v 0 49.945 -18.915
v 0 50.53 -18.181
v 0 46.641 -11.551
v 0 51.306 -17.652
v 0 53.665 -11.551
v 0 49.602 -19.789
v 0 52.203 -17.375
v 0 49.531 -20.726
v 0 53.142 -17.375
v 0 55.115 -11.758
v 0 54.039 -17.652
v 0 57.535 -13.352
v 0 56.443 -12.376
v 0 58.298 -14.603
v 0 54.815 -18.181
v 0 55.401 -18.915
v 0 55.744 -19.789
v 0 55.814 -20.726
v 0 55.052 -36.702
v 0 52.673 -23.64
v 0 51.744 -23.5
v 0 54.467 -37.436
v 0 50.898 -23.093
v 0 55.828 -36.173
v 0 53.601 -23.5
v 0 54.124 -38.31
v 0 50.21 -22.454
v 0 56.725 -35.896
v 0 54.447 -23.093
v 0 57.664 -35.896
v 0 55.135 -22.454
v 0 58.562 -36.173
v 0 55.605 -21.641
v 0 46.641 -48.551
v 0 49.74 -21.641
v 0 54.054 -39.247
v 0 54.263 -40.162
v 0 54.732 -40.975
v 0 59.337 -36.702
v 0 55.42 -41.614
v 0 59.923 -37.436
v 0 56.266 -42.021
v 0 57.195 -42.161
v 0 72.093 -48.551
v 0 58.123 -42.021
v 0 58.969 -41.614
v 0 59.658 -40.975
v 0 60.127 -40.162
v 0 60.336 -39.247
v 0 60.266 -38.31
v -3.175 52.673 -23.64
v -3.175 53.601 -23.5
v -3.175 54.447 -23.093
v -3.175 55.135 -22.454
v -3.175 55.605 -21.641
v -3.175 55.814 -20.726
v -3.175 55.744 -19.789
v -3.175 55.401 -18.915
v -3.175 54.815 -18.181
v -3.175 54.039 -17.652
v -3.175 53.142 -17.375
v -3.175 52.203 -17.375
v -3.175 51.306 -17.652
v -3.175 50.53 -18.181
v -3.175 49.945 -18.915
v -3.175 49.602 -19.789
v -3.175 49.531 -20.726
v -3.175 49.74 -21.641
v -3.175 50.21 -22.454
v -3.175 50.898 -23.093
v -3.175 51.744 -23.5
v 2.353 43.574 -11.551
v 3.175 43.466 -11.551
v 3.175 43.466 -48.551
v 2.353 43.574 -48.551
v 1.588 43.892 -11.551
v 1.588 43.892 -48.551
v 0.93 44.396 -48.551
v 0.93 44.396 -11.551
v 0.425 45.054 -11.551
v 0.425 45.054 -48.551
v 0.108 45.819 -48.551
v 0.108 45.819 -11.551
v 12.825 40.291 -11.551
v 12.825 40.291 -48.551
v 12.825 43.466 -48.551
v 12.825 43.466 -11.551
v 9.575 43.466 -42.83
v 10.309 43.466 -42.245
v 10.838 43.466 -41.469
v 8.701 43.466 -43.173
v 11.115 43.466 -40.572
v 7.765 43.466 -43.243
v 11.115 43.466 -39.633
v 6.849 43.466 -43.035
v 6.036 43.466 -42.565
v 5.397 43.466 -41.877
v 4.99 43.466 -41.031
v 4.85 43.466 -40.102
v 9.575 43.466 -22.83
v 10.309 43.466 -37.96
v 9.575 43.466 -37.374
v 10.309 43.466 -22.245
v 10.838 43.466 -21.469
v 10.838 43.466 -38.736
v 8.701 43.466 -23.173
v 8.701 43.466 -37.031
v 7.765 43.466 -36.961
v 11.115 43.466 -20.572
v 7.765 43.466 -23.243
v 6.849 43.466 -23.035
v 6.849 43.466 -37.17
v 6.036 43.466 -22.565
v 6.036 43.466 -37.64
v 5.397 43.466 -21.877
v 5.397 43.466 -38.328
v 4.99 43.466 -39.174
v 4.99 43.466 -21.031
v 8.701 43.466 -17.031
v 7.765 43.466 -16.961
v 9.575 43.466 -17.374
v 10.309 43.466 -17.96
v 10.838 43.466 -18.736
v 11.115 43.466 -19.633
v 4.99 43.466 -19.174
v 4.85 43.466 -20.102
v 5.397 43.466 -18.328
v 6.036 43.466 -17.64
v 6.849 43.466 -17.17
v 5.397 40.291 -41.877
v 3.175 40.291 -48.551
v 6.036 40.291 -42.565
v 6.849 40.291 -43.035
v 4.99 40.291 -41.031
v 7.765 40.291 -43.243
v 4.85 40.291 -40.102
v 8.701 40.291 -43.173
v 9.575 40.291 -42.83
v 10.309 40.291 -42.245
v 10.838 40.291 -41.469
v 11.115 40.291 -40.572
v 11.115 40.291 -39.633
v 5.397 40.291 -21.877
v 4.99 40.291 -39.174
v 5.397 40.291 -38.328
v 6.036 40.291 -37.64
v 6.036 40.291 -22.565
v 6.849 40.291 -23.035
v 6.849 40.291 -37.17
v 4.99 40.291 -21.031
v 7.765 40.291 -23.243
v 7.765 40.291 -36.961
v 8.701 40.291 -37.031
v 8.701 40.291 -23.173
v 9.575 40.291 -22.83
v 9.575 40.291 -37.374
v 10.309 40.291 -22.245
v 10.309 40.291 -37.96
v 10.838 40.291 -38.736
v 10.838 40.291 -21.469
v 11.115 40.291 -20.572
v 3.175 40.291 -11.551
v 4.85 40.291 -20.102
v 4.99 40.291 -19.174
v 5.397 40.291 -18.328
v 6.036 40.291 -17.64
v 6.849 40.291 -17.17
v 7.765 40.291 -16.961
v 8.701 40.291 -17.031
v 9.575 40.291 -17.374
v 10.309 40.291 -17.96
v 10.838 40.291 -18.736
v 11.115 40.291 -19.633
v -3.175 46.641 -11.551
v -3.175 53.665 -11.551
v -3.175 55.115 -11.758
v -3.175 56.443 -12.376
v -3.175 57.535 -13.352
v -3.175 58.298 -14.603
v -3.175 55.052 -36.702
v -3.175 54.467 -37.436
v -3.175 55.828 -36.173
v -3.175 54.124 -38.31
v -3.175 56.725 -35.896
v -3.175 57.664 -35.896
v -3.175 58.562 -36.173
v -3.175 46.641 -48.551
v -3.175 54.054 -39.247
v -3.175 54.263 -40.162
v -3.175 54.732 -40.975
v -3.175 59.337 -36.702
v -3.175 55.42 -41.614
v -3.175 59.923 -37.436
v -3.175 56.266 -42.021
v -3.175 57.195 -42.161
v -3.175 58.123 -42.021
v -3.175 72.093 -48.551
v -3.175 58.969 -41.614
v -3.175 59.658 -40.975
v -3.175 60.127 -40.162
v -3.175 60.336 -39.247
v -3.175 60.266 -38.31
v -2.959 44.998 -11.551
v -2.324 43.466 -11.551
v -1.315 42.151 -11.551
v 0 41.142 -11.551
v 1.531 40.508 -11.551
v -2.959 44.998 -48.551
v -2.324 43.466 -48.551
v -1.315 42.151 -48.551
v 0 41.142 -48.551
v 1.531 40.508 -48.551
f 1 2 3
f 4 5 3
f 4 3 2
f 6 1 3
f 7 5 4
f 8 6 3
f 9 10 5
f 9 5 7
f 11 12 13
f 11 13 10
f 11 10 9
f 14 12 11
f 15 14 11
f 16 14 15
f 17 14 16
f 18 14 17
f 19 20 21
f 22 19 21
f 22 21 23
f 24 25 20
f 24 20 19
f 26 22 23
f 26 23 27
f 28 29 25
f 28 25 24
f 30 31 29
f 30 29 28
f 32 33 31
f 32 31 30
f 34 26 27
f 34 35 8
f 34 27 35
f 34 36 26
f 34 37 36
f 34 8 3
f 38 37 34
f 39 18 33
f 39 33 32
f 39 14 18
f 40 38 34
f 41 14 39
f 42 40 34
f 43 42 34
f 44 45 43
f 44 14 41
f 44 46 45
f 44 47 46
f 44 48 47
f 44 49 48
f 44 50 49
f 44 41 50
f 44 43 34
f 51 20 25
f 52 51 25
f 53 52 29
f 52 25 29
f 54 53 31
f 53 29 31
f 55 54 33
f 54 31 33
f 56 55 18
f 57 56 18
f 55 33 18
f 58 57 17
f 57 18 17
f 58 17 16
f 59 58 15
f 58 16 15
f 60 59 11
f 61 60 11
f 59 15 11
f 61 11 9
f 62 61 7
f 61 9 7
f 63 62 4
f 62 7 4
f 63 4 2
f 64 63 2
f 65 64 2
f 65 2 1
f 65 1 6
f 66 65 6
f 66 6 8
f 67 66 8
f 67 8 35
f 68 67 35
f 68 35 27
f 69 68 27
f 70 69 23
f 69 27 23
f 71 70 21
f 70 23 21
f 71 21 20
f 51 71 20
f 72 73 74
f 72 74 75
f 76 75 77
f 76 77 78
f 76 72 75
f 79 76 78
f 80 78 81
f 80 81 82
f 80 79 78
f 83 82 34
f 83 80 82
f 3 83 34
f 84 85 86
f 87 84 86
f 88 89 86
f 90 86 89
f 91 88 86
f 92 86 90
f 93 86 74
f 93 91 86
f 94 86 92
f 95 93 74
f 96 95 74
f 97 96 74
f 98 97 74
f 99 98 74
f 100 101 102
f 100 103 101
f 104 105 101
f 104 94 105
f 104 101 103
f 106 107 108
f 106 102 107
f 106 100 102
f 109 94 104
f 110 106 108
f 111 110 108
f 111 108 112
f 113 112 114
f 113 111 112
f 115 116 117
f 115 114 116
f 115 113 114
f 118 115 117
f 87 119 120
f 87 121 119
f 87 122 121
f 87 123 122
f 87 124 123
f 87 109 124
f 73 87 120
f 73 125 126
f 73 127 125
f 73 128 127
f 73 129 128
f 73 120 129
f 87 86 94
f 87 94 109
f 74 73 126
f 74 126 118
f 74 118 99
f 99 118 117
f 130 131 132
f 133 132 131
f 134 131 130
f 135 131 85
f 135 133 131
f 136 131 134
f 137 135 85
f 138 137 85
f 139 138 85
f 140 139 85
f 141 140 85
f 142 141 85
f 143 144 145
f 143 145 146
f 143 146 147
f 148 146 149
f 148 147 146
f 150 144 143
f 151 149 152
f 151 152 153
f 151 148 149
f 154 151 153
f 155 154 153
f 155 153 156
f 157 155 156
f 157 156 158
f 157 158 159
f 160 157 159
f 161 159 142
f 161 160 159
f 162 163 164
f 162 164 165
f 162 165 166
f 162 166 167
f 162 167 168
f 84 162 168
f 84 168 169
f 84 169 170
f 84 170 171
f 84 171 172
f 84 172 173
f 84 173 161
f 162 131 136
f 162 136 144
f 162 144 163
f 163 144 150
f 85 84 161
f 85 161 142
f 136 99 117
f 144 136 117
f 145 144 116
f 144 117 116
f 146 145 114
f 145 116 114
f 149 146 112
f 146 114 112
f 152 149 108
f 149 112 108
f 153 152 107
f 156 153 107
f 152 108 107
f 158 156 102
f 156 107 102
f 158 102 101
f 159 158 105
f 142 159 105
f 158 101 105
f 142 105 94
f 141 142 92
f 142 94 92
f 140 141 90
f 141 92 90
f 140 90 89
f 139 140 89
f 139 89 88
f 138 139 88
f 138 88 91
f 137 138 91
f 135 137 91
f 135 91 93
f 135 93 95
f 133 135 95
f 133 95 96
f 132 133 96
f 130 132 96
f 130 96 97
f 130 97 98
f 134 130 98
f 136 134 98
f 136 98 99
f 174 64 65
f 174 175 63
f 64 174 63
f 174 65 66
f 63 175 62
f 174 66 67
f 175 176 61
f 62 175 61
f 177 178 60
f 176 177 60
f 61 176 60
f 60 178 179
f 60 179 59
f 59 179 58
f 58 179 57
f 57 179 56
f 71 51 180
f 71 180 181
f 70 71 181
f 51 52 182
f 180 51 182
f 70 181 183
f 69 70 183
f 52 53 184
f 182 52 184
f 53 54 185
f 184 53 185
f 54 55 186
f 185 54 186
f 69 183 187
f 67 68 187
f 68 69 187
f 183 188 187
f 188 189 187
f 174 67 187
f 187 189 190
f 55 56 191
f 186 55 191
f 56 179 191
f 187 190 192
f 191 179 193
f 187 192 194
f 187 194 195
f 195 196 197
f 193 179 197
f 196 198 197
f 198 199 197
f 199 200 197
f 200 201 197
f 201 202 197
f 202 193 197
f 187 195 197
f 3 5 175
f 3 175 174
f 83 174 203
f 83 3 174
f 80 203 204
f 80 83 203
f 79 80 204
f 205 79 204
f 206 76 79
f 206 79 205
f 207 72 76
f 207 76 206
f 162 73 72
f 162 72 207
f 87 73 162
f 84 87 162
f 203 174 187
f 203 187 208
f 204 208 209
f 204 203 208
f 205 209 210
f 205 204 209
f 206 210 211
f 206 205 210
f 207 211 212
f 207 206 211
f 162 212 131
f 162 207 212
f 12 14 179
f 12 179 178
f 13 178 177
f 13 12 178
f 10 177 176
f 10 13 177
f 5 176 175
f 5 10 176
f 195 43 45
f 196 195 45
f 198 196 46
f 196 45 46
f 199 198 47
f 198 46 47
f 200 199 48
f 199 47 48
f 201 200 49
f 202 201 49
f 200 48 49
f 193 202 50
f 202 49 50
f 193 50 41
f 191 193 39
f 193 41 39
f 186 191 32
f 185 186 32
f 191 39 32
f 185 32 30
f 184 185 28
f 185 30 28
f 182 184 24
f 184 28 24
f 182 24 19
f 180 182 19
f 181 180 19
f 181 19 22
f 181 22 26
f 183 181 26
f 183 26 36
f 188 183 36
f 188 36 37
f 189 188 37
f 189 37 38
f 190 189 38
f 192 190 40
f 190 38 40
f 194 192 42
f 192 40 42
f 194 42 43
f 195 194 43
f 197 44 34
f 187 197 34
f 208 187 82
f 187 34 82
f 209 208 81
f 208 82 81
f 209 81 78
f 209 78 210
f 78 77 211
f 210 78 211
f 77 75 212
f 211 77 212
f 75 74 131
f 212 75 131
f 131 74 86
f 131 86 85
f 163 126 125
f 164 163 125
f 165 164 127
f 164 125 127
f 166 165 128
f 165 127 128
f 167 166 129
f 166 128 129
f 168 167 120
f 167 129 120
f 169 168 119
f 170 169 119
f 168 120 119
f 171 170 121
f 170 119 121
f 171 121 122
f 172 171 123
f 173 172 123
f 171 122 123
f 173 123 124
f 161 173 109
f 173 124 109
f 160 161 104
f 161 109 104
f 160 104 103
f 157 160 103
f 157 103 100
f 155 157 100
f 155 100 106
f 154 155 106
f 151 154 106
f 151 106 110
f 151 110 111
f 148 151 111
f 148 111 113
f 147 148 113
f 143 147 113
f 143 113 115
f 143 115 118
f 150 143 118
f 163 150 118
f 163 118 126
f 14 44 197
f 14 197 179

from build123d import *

# Parameters (mm, degrees)
SKETCH2_R                    = 3.15
BASE_FLANGE1_DEPTH           = 3.175
EDGE_FLANGE1_STRIP_W         = 19.05
EDGE_FLANGE1_STRIP_H         = 3.175
EDGE_FLANGE1_STRIP_CUT_DEPTH = 37
EDGE_FLANGE1_DEPTH           = 37
SKETCH10_R                   = 3.15
CUT_EXTRUDE1_DEPTH           = 10


# Sheet-metal steps are written as plain solids
with BuildPart() as part:
    # Sketch2 → Base-Flange1 (new body)
    with BuildSketch(Plane(origin=(0, 0, 0), x_dir=(0, 0, -1), z_dir=(1, 0, 0))):
        with BuildLine():
            Line((48.551064785, 40.291218586), (48.551064785, 72.093066751))
            Line((48.551064785, 72.093066751), (14.602650648, 58.297559694))
            ThreePointArc((14.602650648, 58.297559694), (12.37556545, 56.443388888), (11.551064785, 53.665249851))
            Line((11.551064785, 53.665249851), (11.551064785, 40.291218586))
            Line((11.551064785, 40.291218586), (48.551064785, 40.291218586))
        make_face()
        with Locations((39.011220588, 57.194773579)):
            Circle(SKETCH2_R, mode=Mode.SUBTRACT)
        with Locations((20.490203266, 52.672523101)):
            Circle(SKETCH2_R, mode=Mode.SUBTRACT)
    extrude(amount=-BASE_FLANGE1_DEPTH)

    # Edge-Flange1 strip (across the edge) → Edge-Flange1 strip cut (cut)
    with BuildSketch(Plane(origin=(0, 40.291218586, -11.551064785), x_dir=(0, 1, 0), z_dir=(0, 0, -1))):
        with Locations((-3.175, -1.5875)):
            Rectangle(EDGE_FLANGE1_STRIP_W, EDGE_FLANGE1_STRIP_H)
    extrude(amount=EDGE_FLANGE1_STRIP_CUT_DEPTH, mode=Mode.SUBTRACT)

    # Edge-Flange1 section (across the edge) → Edge-Flange1 (add)
    with BuildSketch(Plane(origin=(0, 40.291218586, -11.551064785), x_dir=(0, 1, 0), z_dir=(0, 0, -1))):
        with BuildLine():
            Line((0, 3.175), (0, 12.825))
            Line((0, 12.825), (3.175, 12.825))
            Line((3.175, 12.825), (3.175, 3.175))
            ThreePointArc((3.175, 3.175), (4.10493597, 0.92993597), (6.35, 0))
            Line((6.35, 0), (6.35, -3.175))
            ThreePointArc((6.35, -3.175), (1.859871939, -1.315128061), (0, 3.175))
        make_face()
    extrude(amount=EDGE_FLANGE1_DEPTH)

    # Sketch10 → Cut-Extrude1 (cut)
    with BuildSketch(Plane(origin=(0, 43.466218586, 0), x_dir=(1, 0, 0), z_dir=(0, 1, 0))):
        with Locations(Location((8, 40.102300831, 0), (0, 0, 180))):
            Circle(SKETCH10_R)
        with Locations(Location((8, 20.102300831, 0), (0, 0, 180))):
            Circle(SKETCH10_R)
    extrude(amount=-CUT_EXTRUDE1_DEPTH, mode=Mode.SUBTRACT)


solid = part.part
